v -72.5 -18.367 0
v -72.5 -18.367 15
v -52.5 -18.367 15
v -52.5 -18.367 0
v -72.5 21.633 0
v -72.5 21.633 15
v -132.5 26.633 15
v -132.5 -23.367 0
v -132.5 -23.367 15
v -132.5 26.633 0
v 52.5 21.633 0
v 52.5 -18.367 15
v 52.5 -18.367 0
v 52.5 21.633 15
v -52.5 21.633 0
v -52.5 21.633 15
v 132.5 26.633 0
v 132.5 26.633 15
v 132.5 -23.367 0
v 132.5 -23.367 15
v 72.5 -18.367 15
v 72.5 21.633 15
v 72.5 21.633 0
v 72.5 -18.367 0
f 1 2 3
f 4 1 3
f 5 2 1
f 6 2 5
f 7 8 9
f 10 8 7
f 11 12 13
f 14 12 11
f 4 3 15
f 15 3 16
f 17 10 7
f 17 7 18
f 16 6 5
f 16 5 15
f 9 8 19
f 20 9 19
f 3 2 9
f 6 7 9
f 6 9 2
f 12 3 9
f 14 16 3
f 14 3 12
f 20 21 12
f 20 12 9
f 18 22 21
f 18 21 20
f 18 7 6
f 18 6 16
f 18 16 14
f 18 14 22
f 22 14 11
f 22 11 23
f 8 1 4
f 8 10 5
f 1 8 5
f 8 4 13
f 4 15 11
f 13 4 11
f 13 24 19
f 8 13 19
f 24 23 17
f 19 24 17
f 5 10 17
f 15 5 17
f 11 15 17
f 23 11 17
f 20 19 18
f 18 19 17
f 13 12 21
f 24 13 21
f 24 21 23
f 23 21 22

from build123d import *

# Parameters (mm, degrees)
F0_W     = 265
F0_H     = 50
F1_DEPTH = 15
F2_W     = 20
F2_H     = 40
F3_DEPTH = 39.9
F4_DEPTH = 35.1


with BuildPart() as f1:
    # F0 (on Top) → F1 (new body)
    with BuildSketch(Plane.XY):
        with Locations((0, 1.633065)):
            Rectangle(F0_W, F0_H)
    extrude(amount=F1_DEPTH)

    # F2 (on face) → F3 (cut)
    with BuildSketch(Plane.XY.offset(15)):
        with Locations((-62.5, 1.633065)):
            Rectangle(F2_W, F2_H)
        with Locations((62.5, 1.633065)):
            Rectangle(F2_W, F2_H)
    extrude(amount=-F3_DEPTH, mode=Mode.SUBTRACT)

    # F2 (on face) → F4 (cut)
    with BuildSketch(Plane.XY.offset(15)):
        with Locations((-62.5, 1.633065)):
            Rectangle(F2_W, F2_H)
        with Locations((62.5, 1.633065)):
            Rectangle(F2_W, F2_H)
    extrude(amount=-F4_DEPTH, mode=Mode.SUBTRACT)


solid = f1.part
